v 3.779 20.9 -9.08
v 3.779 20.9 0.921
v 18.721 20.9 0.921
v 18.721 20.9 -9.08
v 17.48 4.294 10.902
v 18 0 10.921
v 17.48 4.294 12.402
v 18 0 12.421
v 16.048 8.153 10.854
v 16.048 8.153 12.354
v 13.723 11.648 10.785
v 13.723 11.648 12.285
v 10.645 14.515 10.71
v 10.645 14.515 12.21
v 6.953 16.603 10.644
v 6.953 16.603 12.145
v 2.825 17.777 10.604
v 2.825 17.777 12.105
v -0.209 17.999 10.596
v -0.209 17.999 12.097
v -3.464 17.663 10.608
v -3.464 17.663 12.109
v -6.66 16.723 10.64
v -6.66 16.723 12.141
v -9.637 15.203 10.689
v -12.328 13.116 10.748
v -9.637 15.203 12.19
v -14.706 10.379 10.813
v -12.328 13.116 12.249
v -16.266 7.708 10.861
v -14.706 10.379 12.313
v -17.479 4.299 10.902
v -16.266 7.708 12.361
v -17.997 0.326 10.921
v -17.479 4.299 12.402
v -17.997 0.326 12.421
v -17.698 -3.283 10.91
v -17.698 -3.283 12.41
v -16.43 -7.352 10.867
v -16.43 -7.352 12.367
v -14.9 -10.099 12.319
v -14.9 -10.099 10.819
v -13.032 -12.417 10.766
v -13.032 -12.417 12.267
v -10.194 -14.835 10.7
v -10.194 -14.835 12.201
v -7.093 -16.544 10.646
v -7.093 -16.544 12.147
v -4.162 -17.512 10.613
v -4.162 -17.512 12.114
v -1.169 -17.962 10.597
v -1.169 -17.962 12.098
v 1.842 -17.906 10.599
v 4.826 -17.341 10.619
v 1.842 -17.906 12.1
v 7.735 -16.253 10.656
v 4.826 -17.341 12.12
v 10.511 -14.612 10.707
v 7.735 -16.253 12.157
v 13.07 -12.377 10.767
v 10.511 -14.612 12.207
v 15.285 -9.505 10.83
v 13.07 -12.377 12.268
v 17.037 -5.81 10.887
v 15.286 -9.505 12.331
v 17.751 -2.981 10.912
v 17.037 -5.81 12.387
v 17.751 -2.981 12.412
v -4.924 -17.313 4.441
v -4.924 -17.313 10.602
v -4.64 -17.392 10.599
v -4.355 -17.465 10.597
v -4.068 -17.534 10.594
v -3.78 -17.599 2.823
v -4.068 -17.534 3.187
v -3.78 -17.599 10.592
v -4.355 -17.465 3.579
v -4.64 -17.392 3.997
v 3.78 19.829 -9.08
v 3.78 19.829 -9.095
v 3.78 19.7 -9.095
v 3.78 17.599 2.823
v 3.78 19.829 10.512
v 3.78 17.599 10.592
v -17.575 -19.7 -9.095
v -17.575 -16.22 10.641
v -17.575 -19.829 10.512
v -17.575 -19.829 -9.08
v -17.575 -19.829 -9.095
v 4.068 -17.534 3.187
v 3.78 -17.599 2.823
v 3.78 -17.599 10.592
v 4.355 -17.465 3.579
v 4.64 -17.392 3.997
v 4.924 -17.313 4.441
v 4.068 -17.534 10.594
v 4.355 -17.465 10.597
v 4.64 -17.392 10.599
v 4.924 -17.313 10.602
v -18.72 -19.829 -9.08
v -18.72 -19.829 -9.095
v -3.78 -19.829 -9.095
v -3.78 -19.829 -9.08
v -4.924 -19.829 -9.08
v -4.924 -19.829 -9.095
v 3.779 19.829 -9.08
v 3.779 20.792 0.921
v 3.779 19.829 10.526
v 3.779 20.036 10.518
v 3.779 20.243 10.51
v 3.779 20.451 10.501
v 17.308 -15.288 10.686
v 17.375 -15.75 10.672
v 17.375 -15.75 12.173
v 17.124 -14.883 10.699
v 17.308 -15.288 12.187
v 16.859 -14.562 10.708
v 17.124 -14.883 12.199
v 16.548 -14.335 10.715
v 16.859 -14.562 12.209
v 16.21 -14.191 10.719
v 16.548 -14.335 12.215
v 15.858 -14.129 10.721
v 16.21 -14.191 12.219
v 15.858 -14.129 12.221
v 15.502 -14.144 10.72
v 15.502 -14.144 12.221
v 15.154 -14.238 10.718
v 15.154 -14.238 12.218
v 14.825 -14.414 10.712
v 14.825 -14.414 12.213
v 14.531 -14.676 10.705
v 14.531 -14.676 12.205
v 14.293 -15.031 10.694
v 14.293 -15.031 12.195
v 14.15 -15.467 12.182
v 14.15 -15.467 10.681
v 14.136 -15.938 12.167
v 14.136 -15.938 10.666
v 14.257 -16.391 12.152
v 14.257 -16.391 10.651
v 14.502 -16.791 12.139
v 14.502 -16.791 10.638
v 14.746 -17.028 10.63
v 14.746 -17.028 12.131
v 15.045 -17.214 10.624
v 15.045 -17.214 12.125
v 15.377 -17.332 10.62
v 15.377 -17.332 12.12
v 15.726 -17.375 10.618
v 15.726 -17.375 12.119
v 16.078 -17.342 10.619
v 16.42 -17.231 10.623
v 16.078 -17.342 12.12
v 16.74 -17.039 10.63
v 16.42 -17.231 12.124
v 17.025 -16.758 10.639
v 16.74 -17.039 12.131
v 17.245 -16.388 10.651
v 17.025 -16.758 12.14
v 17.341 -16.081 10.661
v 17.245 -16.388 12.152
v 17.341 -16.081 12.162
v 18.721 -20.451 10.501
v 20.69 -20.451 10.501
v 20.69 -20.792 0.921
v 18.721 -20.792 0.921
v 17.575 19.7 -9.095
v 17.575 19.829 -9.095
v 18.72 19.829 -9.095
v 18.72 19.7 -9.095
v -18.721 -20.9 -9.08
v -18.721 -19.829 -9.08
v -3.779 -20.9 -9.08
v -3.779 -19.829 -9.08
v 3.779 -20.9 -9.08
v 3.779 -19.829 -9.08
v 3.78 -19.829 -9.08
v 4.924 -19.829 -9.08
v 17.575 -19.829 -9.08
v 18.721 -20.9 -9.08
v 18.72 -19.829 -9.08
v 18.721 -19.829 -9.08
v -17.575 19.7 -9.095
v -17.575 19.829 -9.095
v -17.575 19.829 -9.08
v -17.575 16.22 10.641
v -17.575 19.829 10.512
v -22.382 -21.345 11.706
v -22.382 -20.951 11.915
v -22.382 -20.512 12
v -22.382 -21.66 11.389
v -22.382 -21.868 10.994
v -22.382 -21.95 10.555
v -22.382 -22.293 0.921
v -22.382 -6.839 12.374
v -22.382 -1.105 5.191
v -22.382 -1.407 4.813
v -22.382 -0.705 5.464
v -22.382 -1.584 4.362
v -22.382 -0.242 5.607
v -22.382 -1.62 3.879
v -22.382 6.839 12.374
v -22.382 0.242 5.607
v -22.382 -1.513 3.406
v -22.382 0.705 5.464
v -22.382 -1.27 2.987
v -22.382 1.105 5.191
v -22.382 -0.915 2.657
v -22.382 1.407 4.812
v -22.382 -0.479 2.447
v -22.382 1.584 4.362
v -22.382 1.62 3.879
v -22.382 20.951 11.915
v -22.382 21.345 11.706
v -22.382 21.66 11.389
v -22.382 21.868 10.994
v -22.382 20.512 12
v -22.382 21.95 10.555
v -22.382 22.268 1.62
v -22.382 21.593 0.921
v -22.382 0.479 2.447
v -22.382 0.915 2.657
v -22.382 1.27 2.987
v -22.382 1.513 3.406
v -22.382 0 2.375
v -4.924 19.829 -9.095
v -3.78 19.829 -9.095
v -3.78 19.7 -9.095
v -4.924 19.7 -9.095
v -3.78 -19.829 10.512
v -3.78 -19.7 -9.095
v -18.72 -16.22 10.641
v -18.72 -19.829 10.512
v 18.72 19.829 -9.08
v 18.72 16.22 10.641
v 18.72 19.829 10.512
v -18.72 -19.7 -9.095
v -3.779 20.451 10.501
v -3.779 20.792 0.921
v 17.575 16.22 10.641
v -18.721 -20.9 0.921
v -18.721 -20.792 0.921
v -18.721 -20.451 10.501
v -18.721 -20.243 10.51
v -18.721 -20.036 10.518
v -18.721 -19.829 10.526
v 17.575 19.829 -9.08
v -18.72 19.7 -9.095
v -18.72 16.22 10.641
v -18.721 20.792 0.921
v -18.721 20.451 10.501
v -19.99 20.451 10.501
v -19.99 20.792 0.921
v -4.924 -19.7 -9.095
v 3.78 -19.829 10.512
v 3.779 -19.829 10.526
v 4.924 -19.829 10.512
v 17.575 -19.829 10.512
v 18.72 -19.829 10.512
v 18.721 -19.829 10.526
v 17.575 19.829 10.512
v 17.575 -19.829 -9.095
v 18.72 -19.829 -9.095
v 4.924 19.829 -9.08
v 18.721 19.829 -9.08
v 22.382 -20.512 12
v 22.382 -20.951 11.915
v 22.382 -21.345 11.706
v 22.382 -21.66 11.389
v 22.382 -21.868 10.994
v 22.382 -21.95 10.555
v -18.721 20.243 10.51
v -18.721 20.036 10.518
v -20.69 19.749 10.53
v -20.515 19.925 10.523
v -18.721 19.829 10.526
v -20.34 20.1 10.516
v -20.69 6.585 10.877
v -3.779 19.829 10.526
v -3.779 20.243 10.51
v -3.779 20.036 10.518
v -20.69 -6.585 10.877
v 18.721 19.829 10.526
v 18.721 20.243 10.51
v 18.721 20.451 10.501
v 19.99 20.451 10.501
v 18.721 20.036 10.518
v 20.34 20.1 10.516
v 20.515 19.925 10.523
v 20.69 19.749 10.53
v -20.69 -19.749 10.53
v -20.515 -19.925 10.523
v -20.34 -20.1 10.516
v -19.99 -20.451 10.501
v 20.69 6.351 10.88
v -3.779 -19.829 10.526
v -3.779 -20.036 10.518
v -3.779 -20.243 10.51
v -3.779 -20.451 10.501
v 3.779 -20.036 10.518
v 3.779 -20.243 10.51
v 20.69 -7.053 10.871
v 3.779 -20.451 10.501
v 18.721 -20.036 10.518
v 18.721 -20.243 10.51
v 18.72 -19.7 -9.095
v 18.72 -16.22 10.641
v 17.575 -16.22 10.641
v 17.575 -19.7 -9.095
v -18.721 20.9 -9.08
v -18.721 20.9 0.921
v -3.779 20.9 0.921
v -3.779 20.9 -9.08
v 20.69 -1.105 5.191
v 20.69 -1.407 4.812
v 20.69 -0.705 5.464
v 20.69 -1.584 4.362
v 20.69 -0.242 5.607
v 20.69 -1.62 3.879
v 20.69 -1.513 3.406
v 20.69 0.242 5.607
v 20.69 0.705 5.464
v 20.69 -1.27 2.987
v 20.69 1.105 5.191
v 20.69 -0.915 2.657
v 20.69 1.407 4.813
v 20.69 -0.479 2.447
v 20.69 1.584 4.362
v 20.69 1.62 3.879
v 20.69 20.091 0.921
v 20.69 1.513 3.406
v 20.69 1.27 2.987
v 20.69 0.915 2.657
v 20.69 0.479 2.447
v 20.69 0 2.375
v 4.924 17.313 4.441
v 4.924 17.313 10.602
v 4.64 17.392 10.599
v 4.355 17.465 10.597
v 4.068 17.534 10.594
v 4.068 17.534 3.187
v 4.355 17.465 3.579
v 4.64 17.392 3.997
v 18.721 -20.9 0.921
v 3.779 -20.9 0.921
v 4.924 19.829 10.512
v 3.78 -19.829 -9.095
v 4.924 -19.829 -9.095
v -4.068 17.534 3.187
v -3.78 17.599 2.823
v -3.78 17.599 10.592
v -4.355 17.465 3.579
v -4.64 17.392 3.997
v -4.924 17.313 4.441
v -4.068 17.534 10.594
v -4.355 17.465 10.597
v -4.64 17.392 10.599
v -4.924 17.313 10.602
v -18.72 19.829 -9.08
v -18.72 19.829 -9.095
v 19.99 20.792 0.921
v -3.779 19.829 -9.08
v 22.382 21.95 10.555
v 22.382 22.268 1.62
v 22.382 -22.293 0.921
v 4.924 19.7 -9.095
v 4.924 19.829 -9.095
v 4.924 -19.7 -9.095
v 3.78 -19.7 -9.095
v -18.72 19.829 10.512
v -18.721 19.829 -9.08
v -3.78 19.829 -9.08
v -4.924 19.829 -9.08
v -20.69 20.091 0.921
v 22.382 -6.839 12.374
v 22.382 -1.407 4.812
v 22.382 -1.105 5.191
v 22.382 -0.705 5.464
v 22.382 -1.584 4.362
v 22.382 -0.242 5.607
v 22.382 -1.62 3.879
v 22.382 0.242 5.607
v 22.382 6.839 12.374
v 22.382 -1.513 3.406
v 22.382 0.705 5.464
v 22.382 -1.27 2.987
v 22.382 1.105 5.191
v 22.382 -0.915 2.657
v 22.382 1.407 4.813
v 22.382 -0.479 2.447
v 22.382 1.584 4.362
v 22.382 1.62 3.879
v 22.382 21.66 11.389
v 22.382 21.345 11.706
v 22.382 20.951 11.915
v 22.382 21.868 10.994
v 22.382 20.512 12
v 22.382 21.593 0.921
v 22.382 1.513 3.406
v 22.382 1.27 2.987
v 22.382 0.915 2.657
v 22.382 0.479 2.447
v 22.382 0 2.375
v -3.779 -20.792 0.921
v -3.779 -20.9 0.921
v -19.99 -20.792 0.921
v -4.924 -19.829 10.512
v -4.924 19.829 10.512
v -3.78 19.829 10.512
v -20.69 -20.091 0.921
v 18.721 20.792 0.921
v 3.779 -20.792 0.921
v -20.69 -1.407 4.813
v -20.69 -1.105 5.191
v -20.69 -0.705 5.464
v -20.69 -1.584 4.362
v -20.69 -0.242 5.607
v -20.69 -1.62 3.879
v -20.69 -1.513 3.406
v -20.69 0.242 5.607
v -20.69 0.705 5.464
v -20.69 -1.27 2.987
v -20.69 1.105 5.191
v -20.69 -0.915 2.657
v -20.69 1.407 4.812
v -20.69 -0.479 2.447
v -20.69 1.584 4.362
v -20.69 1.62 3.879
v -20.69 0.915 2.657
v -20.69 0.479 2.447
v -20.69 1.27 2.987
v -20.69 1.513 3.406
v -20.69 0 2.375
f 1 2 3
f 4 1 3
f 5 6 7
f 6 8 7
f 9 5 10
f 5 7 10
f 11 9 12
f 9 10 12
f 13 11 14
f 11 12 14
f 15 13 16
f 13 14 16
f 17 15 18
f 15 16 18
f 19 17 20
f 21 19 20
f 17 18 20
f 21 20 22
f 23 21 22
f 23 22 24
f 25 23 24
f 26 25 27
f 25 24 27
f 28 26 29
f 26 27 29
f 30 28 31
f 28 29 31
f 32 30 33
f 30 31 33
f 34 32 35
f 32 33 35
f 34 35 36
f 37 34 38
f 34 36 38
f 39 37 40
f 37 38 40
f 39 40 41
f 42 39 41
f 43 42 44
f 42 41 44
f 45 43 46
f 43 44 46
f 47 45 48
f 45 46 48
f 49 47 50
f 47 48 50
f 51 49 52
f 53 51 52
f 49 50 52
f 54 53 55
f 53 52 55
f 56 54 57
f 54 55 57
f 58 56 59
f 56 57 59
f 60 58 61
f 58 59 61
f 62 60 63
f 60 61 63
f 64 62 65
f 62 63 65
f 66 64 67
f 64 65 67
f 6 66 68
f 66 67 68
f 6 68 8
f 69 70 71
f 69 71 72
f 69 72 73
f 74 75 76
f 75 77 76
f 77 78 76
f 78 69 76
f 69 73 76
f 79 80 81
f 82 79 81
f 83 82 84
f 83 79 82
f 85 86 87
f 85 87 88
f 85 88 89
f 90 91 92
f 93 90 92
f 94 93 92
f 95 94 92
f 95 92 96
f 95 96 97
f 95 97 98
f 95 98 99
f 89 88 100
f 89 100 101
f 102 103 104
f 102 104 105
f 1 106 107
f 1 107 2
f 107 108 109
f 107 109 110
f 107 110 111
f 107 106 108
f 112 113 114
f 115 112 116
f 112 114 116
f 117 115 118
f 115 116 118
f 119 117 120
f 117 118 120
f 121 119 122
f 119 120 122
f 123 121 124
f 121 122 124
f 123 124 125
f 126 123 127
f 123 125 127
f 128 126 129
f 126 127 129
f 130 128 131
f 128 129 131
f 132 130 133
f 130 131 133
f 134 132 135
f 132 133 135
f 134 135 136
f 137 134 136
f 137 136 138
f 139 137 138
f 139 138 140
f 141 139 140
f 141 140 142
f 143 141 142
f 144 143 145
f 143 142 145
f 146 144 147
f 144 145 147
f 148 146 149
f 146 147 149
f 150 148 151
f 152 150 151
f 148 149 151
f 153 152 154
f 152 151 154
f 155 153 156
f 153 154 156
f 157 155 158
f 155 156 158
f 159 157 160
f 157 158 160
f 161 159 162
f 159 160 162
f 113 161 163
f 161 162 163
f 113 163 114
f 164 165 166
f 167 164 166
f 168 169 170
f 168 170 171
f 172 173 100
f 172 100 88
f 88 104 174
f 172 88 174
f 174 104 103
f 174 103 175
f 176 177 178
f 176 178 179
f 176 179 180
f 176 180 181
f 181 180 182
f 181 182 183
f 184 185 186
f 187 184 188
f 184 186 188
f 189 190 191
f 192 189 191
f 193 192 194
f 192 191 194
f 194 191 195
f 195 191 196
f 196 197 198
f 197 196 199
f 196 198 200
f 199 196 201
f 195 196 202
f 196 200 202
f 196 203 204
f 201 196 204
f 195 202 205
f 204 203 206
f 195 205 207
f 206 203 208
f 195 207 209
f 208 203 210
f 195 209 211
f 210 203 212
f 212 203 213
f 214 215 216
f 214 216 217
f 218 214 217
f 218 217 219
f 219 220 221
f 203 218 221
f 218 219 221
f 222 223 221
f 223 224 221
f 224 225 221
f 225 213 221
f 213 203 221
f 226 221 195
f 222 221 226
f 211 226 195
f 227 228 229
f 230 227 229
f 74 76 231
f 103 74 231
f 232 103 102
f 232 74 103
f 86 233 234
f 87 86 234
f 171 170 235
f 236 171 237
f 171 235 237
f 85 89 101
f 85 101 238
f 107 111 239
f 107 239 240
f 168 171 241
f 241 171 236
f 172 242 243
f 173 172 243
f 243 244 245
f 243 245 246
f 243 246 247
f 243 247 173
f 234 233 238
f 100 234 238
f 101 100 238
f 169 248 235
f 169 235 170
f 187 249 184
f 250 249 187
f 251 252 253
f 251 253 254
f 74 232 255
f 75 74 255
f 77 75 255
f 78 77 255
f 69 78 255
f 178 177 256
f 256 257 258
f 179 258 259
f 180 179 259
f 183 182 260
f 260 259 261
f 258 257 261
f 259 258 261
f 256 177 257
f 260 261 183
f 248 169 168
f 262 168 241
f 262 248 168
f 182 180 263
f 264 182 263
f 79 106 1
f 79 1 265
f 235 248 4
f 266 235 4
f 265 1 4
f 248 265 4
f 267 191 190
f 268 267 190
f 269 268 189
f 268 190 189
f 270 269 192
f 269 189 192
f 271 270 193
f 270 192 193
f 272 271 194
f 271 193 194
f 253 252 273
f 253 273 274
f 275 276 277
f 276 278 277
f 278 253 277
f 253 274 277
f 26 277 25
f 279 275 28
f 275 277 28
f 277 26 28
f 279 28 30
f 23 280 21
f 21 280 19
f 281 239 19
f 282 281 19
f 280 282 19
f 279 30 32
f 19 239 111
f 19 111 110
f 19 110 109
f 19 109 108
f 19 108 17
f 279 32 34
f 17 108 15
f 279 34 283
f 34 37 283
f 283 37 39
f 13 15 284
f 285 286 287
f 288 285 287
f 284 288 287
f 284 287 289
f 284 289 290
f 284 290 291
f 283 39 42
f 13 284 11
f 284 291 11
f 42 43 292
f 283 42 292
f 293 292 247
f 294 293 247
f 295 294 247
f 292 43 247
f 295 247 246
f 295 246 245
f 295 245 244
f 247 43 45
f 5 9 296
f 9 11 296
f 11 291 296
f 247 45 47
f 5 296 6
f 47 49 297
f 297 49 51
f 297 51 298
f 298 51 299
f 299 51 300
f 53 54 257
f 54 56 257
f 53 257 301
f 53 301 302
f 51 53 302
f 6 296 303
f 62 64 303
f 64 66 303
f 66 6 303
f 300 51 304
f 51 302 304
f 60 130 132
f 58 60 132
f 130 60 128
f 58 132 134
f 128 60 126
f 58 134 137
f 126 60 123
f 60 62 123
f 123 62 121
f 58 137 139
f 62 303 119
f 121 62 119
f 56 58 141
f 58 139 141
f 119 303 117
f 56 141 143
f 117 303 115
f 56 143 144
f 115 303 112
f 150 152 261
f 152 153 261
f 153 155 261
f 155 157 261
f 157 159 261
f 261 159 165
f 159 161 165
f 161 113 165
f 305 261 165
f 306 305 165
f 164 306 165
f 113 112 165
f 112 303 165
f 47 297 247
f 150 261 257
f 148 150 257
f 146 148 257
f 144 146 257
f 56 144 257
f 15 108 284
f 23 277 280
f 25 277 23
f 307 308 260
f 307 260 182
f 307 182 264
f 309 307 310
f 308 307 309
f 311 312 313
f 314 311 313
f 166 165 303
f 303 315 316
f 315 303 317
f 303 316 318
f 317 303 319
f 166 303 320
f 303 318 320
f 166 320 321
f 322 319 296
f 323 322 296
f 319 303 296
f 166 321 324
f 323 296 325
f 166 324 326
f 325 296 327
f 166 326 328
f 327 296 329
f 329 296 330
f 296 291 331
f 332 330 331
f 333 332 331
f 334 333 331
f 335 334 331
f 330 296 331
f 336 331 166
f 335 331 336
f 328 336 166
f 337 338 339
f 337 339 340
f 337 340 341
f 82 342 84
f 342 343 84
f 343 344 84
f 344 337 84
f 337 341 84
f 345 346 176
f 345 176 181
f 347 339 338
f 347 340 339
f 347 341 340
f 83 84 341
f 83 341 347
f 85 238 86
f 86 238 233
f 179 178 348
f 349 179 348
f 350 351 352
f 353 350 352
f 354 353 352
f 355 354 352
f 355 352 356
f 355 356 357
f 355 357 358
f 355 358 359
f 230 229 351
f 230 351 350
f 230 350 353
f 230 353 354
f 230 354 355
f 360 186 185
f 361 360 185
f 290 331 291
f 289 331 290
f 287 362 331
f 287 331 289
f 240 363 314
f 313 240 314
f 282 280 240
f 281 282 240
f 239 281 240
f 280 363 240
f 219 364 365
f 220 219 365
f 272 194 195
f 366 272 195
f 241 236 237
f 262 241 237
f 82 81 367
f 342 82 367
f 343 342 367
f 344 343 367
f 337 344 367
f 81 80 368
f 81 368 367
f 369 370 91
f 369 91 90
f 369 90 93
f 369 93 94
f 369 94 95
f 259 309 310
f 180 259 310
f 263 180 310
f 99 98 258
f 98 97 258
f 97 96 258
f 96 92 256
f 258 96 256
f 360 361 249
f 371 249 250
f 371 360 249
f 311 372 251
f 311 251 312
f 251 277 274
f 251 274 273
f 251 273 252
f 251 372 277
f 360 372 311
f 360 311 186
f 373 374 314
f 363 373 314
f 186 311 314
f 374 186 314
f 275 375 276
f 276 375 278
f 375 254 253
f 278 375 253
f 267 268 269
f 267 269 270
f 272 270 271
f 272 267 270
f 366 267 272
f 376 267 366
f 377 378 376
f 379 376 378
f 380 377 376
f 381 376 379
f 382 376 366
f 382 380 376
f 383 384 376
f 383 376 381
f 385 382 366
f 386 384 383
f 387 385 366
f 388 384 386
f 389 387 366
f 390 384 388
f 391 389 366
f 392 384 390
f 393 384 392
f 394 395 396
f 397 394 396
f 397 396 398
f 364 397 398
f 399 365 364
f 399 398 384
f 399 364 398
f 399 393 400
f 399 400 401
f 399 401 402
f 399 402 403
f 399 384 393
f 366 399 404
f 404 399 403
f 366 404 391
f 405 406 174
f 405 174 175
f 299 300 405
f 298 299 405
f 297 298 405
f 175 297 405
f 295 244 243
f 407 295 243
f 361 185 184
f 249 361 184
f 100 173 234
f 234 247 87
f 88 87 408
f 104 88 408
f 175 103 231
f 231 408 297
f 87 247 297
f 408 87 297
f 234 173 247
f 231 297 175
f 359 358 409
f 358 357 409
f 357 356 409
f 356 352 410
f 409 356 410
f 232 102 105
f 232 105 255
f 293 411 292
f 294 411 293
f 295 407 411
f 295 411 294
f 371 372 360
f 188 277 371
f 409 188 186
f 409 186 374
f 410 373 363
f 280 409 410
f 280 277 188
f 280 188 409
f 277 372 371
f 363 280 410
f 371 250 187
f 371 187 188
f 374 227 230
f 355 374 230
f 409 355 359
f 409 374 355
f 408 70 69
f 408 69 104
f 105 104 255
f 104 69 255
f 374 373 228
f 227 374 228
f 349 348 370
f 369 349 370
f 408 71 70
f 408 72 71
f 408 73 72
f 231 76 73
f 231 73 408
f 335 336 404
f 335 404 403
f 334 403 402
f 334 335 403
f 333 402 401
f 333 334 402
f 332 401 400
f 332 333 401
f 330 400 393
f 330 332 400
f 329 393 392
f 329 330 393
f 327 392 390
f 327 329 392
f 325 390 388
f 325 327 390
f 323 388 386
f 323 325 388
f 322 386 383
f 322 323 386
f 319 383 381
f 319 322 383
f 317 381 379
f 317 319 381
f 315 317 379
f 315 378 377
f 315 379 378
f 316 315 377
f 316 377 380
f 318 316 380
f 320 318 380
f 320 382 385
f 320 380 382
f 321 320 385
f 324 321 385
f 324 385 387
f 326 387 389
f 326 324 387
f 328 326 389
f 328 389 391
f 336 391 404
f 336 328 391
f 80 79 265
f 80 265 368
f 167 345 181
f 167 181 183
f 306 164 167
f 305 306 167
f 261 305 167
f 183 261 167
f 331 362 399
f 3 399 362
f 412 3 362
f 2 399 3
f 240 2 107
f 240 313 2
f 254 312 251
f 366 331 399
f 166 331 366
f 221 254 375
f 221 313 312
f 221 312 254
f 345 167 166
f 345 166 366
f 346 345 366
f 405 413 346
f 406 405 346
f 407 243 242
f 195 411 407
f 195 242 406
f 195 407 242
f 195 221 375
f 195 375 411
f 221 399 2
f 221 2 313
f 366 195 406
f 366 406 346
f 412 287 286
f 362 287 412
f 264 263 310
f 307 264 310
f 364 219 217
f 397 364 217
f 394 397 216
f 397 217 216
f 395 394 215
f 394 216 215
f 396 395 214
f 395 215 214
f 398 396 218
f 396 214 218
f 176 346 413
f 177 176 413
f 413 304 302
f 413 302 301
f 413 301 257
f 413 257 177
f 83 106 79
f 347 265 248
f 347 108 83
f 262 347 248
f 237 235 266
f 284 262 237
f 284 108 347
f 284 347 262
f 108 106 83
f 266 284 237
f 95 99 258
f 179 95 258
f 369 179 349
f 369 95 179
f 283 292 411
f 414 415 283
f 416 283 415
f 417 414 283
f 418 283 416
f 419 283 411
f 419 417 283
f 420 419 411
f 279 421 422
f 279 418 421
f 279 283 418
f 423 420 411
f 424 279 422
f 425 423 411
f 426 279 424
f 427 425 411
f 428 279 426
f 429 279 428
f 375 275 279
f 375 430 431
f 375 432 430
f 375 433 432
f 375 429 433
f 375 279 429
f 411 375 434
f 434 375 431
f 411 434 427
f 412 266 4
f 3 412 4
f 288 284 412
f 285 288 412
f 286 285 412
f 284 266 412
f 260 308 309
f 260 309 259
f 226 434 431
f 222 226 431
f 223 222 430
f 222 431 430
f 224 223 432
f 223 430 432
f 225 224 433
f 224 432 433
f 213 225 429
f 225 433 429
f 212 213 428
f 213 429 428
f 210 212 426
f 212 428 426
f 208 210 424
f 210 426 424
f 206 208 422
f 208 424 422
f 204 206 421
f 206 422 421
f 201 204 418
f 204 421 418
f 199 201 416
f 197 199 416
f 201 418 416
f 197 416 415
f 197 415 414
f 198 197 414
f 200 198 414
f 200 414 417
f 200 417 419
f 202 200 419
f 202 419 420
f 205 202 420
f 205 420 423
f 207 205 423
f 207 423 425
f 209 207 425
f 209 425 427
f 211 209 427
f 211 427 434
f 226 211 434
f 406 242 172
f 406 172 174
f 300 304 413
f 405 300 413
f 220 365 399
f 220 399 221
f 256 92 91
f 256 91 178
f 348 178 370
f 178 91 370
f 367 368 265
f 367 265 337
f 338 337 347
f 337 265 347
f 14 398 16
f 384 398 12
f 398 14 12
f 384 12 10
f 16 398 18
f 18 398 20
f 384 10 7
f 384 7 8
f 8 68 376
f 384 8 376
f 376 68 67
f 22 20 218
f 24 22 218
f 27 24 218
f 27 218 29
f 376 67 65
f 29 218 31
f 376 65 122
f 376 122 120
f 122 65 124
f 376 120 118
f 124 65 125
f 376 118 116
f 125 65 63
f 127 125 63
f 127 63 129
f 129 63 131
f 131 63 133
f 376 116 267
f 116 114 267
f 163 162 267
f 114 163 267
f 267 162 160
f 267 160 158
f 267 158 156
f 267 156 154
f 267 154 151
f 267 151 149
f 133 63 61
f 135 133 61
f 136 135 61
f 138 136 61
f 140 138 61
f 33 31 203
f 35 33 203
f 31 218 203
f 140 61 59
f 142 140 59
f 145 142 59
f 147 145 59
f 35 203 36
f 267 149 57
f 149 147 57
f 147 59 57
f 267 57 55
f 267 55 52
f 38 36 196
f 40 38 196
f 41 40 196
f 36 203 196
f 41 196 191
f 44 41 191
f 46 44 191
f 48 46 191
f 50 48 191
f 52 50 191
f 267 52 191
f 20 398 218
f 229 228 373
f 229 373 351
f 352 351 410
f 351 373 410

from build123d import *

# Parameters (mm, degrees)
PAD_DEPTH            = 20.6929
PAD001_DEPTH         = 1.692
PAD002_DEPTH         = 1.692
PAD003_START         = -1
SKETCH003_W          = 14.9418
SKETCH003_H          = 1.0711
PAD003_DEPTH         = 20.08
PAD004_DEPTH         = 1.1445
PAD005_DEPTH         = 1.1445
PAD006_DEPTH         = 1.1445
PAD007_DEPTH         = 1.1445
SKETCH008_R          = 18
SKETCH008_R_2        = 1.625
POCKET_DEPTH         = 21.0957
POCKET_DEPTH_BACK    = 0.4219
CHAMFER001_SIZE      = 0.7
SKETCH013_R          = 1.625
POCKET001_DEPTH      = 22.383
POCKET001_DEPTH_BACK = 22.383
BODY_PLACEMENT_ANGLE = 90


with BuildPart() as part:
    # Sketch → Pad (new body, symmetric)
    with BuildSketch(Plane.YZ):
        with BuildLine():
            ThreePointArc((0, 20.5122), (-0.4209, 0), (0, -20.5122))
            ThreePointArc((0, -20.5122), (0.44097, -21.514212), (1.445369, -21.949718))
            Line((1.445369, -21.949718), (11.0791, -22.292695))
            Line((11.0791, -22.292695), (11.0791, -20.791745))
            Line((1.498737, -20.450667), (11.0791, -20.791745))
            ThreePointArc((1.498737, 20.450667), (1.0791, 0), (1.498737, -20.450667))
            Line((1.498737, 20.450667), (11.0791, 20.791745))
            Line((11.0791, 20.791745), (11.0791, 22.292695))
            Line((1.445369, 21.949718), (11.0791, 22.292695))
            ThreePointArc((1.445369, 21.949718), (0.44097, 21.514212), (0, 20.5122))
        make_face()
    extrude(amount=PAD_DEPTH, both=True)

    # Sketch001 → Pad001 (join)
    with BuildSketch(Plane.YZ.offset(20.69)):
        with BuildLine():
            ThreePointArc((0, 20.5122), (-0.4209, 0), (0, -20.5122))
            ThreePointArc((0, -20.5122), (0.44097, -21.514212), (1.445369, -21.949718))
            Line((1.445369, -21.949718), (11.0791, -22.292695))
            Line((11.0791, 22.292695), (11.0791, -22.292695))
            Line((1.445369, 21.949718), (11.0791, 22.292695))
            ThreePointArc((1.445369, 21.949718), (0.44097, 21.514212), (0, 20.5122))
        make_face()
    extrude(amount=PAD001_DEPTH)

    # Sketch002 → Pad002 (join)
    with BuildSketch(Plane.YZ.offset(-20.69)):
        with BuildLine():
            ThreePointArc((0, 20.5122), (-0.4209, 0), (0, -20.5122))
            ThreePointArc((0, -20.5122), (0.44097, -21.514212), (1.445369, -21.949718))
            Line((1.445369, -21.949718), (11.0791, -22.292695))
            Line((11.0791, 22.292695), (11.0791, -22.292695))
            Line((1.445369, 21.949718), (11.0791, 22.292695))
            ThreePointArc((1.445369, 21.949718), (0.44097, 21.514212), (0, 20.5122))
        make_face()
    extrude(amount=-PAD002_DEPTH)

    # Sketch003 → Pad003 (join)
    with BuildSketch(Plane.XZ.offset(PAD003_START)):
        with Locations((-11.25, 20.36445)):
            Rectangle(SKETCH003_W, SKETCH003_H)
        with Locations((11.25, 20.36445)):
            Rectangle(SKETCH003_W, SKETCH003_H)
        with Locations((-11.25, -20.36445)):
            Rectangle(SKETCH003_W, SKETCH003_H)
        with Locations((11.25, -20.36445)):
            Rectangle(SKETCH003_W, SKETCH003_H)
    extrude(amount=-PAD003_DEPTH)

    # Sketch004 → Pad004 (join)
    with BuildSketch(Plane.YZ.offset(3.78)):
        Polygon((1.358658, 16.220017), (1.488, 19.8289), (21.0947, 19.8289), (21.0947, 19.7), align=None)
        Polygon((1.358658, -16.220017), (1.488, -19.8289), (21.0947, -19.8289), (21.0947, -19.7), align=None)
    extrude(amount=PAD004_DEPTH)

    # Sketch005 → Pad005 (join)
    with BuildSketch(Plane.YZ.offset(-3.78)):
        Polygon((1.358658, 16.220017), (1.488, 19.8289), (21.0947, 19.8289), (21.0947, 19.7), align=None)
        Polygon((1.358658, -16.220017), (1.488, -19.8289), (21.0947, -19.8289), (21.0947, -19.7), align=None)
    extrude(amount=-PAD005_DEPTH)

    # Sketch006 → Pad006 (join)
    with BuildSketch(Plane.YZ.offset(18.72)):
        Polygon((1.358658, 16.220017), (1.488, 19.8289), (21.0947, 19.8289), (21.0947, 19.7), align=None)
        Polygon((1.358658, -16.220017), (1.488, -19.8289), (21.0947, -19.8289), (21.0947, -19.7), align=None)
    extrude(amount=-PAD006_DEPTH)

    # Sketch007 → Pad007 (join)
    with BuildSketch(Plane.YZ.offset(-18.72)):
        Polygon((1.358658, 16.220017), (1.488, 19.8289), (21.0947, 19.8289), (21.0947, 19.7), align=None)
        Polygon((1.358658, -16.220017), (1.488, -19.8289), (21.0947, -19.8289), (21.0947, -19.7), align=None)
    extrude(amount=PAD007_DEPTH)

    # Sketch008 → Pocket (cut, two sides)
    with BuildSketch(Plane.XZ) as pocket_sk:
        Circle(SKETCH008_R)
        with Locations((15.750096, -15.750096)):
            Circle(SKETCH008_R_2)
    extrude(amount=-POCKET_DEPTH, mode=Mode.SUBTRACT)
    extrude(pocket_sk.sketch, amount=POCKET_DEPTH_BACK, mode=Mode.SUBTRACT)

    # Chamfer001
    chamfer001_edges = [part.edges().sort_by_distance(p)[0] for p in [
        (-20.69, 6.288919, 20.621206),
        (20.69, 6.288919, 20.621206),
        (21.53745, 11.0791, 22.292695),
        (-20.69, 6.288919, -20.621206),
    ]]
    chamfer(chamfer001_edges, length=CHAMFER001_SIZE)

    # Sketch013 → Pocket001 (cut, two sides)
    with BuildSketch(Plane.YZ) as pocket001_sk:
        with Locations((8, 0)):
            Circle(SKETCH013_R)
    extrude(amount=-POCKET001_DEPTH, mode=Mode.SUBTRACT)
    extrude(pocket001_sk.sketch, amount=POCKET001_DEPTH_BACK, mode=Mode.SUBTRACT)


with BuildPart() as part_1:
    # Body placement: moved
    add(part.part.moved(Location((0, 0, 12))).rotate(Axis((0, 0, 12), (-1, 0, 0)), BODY_PLACEMENT_ANGLE))


solid = part_1.part
